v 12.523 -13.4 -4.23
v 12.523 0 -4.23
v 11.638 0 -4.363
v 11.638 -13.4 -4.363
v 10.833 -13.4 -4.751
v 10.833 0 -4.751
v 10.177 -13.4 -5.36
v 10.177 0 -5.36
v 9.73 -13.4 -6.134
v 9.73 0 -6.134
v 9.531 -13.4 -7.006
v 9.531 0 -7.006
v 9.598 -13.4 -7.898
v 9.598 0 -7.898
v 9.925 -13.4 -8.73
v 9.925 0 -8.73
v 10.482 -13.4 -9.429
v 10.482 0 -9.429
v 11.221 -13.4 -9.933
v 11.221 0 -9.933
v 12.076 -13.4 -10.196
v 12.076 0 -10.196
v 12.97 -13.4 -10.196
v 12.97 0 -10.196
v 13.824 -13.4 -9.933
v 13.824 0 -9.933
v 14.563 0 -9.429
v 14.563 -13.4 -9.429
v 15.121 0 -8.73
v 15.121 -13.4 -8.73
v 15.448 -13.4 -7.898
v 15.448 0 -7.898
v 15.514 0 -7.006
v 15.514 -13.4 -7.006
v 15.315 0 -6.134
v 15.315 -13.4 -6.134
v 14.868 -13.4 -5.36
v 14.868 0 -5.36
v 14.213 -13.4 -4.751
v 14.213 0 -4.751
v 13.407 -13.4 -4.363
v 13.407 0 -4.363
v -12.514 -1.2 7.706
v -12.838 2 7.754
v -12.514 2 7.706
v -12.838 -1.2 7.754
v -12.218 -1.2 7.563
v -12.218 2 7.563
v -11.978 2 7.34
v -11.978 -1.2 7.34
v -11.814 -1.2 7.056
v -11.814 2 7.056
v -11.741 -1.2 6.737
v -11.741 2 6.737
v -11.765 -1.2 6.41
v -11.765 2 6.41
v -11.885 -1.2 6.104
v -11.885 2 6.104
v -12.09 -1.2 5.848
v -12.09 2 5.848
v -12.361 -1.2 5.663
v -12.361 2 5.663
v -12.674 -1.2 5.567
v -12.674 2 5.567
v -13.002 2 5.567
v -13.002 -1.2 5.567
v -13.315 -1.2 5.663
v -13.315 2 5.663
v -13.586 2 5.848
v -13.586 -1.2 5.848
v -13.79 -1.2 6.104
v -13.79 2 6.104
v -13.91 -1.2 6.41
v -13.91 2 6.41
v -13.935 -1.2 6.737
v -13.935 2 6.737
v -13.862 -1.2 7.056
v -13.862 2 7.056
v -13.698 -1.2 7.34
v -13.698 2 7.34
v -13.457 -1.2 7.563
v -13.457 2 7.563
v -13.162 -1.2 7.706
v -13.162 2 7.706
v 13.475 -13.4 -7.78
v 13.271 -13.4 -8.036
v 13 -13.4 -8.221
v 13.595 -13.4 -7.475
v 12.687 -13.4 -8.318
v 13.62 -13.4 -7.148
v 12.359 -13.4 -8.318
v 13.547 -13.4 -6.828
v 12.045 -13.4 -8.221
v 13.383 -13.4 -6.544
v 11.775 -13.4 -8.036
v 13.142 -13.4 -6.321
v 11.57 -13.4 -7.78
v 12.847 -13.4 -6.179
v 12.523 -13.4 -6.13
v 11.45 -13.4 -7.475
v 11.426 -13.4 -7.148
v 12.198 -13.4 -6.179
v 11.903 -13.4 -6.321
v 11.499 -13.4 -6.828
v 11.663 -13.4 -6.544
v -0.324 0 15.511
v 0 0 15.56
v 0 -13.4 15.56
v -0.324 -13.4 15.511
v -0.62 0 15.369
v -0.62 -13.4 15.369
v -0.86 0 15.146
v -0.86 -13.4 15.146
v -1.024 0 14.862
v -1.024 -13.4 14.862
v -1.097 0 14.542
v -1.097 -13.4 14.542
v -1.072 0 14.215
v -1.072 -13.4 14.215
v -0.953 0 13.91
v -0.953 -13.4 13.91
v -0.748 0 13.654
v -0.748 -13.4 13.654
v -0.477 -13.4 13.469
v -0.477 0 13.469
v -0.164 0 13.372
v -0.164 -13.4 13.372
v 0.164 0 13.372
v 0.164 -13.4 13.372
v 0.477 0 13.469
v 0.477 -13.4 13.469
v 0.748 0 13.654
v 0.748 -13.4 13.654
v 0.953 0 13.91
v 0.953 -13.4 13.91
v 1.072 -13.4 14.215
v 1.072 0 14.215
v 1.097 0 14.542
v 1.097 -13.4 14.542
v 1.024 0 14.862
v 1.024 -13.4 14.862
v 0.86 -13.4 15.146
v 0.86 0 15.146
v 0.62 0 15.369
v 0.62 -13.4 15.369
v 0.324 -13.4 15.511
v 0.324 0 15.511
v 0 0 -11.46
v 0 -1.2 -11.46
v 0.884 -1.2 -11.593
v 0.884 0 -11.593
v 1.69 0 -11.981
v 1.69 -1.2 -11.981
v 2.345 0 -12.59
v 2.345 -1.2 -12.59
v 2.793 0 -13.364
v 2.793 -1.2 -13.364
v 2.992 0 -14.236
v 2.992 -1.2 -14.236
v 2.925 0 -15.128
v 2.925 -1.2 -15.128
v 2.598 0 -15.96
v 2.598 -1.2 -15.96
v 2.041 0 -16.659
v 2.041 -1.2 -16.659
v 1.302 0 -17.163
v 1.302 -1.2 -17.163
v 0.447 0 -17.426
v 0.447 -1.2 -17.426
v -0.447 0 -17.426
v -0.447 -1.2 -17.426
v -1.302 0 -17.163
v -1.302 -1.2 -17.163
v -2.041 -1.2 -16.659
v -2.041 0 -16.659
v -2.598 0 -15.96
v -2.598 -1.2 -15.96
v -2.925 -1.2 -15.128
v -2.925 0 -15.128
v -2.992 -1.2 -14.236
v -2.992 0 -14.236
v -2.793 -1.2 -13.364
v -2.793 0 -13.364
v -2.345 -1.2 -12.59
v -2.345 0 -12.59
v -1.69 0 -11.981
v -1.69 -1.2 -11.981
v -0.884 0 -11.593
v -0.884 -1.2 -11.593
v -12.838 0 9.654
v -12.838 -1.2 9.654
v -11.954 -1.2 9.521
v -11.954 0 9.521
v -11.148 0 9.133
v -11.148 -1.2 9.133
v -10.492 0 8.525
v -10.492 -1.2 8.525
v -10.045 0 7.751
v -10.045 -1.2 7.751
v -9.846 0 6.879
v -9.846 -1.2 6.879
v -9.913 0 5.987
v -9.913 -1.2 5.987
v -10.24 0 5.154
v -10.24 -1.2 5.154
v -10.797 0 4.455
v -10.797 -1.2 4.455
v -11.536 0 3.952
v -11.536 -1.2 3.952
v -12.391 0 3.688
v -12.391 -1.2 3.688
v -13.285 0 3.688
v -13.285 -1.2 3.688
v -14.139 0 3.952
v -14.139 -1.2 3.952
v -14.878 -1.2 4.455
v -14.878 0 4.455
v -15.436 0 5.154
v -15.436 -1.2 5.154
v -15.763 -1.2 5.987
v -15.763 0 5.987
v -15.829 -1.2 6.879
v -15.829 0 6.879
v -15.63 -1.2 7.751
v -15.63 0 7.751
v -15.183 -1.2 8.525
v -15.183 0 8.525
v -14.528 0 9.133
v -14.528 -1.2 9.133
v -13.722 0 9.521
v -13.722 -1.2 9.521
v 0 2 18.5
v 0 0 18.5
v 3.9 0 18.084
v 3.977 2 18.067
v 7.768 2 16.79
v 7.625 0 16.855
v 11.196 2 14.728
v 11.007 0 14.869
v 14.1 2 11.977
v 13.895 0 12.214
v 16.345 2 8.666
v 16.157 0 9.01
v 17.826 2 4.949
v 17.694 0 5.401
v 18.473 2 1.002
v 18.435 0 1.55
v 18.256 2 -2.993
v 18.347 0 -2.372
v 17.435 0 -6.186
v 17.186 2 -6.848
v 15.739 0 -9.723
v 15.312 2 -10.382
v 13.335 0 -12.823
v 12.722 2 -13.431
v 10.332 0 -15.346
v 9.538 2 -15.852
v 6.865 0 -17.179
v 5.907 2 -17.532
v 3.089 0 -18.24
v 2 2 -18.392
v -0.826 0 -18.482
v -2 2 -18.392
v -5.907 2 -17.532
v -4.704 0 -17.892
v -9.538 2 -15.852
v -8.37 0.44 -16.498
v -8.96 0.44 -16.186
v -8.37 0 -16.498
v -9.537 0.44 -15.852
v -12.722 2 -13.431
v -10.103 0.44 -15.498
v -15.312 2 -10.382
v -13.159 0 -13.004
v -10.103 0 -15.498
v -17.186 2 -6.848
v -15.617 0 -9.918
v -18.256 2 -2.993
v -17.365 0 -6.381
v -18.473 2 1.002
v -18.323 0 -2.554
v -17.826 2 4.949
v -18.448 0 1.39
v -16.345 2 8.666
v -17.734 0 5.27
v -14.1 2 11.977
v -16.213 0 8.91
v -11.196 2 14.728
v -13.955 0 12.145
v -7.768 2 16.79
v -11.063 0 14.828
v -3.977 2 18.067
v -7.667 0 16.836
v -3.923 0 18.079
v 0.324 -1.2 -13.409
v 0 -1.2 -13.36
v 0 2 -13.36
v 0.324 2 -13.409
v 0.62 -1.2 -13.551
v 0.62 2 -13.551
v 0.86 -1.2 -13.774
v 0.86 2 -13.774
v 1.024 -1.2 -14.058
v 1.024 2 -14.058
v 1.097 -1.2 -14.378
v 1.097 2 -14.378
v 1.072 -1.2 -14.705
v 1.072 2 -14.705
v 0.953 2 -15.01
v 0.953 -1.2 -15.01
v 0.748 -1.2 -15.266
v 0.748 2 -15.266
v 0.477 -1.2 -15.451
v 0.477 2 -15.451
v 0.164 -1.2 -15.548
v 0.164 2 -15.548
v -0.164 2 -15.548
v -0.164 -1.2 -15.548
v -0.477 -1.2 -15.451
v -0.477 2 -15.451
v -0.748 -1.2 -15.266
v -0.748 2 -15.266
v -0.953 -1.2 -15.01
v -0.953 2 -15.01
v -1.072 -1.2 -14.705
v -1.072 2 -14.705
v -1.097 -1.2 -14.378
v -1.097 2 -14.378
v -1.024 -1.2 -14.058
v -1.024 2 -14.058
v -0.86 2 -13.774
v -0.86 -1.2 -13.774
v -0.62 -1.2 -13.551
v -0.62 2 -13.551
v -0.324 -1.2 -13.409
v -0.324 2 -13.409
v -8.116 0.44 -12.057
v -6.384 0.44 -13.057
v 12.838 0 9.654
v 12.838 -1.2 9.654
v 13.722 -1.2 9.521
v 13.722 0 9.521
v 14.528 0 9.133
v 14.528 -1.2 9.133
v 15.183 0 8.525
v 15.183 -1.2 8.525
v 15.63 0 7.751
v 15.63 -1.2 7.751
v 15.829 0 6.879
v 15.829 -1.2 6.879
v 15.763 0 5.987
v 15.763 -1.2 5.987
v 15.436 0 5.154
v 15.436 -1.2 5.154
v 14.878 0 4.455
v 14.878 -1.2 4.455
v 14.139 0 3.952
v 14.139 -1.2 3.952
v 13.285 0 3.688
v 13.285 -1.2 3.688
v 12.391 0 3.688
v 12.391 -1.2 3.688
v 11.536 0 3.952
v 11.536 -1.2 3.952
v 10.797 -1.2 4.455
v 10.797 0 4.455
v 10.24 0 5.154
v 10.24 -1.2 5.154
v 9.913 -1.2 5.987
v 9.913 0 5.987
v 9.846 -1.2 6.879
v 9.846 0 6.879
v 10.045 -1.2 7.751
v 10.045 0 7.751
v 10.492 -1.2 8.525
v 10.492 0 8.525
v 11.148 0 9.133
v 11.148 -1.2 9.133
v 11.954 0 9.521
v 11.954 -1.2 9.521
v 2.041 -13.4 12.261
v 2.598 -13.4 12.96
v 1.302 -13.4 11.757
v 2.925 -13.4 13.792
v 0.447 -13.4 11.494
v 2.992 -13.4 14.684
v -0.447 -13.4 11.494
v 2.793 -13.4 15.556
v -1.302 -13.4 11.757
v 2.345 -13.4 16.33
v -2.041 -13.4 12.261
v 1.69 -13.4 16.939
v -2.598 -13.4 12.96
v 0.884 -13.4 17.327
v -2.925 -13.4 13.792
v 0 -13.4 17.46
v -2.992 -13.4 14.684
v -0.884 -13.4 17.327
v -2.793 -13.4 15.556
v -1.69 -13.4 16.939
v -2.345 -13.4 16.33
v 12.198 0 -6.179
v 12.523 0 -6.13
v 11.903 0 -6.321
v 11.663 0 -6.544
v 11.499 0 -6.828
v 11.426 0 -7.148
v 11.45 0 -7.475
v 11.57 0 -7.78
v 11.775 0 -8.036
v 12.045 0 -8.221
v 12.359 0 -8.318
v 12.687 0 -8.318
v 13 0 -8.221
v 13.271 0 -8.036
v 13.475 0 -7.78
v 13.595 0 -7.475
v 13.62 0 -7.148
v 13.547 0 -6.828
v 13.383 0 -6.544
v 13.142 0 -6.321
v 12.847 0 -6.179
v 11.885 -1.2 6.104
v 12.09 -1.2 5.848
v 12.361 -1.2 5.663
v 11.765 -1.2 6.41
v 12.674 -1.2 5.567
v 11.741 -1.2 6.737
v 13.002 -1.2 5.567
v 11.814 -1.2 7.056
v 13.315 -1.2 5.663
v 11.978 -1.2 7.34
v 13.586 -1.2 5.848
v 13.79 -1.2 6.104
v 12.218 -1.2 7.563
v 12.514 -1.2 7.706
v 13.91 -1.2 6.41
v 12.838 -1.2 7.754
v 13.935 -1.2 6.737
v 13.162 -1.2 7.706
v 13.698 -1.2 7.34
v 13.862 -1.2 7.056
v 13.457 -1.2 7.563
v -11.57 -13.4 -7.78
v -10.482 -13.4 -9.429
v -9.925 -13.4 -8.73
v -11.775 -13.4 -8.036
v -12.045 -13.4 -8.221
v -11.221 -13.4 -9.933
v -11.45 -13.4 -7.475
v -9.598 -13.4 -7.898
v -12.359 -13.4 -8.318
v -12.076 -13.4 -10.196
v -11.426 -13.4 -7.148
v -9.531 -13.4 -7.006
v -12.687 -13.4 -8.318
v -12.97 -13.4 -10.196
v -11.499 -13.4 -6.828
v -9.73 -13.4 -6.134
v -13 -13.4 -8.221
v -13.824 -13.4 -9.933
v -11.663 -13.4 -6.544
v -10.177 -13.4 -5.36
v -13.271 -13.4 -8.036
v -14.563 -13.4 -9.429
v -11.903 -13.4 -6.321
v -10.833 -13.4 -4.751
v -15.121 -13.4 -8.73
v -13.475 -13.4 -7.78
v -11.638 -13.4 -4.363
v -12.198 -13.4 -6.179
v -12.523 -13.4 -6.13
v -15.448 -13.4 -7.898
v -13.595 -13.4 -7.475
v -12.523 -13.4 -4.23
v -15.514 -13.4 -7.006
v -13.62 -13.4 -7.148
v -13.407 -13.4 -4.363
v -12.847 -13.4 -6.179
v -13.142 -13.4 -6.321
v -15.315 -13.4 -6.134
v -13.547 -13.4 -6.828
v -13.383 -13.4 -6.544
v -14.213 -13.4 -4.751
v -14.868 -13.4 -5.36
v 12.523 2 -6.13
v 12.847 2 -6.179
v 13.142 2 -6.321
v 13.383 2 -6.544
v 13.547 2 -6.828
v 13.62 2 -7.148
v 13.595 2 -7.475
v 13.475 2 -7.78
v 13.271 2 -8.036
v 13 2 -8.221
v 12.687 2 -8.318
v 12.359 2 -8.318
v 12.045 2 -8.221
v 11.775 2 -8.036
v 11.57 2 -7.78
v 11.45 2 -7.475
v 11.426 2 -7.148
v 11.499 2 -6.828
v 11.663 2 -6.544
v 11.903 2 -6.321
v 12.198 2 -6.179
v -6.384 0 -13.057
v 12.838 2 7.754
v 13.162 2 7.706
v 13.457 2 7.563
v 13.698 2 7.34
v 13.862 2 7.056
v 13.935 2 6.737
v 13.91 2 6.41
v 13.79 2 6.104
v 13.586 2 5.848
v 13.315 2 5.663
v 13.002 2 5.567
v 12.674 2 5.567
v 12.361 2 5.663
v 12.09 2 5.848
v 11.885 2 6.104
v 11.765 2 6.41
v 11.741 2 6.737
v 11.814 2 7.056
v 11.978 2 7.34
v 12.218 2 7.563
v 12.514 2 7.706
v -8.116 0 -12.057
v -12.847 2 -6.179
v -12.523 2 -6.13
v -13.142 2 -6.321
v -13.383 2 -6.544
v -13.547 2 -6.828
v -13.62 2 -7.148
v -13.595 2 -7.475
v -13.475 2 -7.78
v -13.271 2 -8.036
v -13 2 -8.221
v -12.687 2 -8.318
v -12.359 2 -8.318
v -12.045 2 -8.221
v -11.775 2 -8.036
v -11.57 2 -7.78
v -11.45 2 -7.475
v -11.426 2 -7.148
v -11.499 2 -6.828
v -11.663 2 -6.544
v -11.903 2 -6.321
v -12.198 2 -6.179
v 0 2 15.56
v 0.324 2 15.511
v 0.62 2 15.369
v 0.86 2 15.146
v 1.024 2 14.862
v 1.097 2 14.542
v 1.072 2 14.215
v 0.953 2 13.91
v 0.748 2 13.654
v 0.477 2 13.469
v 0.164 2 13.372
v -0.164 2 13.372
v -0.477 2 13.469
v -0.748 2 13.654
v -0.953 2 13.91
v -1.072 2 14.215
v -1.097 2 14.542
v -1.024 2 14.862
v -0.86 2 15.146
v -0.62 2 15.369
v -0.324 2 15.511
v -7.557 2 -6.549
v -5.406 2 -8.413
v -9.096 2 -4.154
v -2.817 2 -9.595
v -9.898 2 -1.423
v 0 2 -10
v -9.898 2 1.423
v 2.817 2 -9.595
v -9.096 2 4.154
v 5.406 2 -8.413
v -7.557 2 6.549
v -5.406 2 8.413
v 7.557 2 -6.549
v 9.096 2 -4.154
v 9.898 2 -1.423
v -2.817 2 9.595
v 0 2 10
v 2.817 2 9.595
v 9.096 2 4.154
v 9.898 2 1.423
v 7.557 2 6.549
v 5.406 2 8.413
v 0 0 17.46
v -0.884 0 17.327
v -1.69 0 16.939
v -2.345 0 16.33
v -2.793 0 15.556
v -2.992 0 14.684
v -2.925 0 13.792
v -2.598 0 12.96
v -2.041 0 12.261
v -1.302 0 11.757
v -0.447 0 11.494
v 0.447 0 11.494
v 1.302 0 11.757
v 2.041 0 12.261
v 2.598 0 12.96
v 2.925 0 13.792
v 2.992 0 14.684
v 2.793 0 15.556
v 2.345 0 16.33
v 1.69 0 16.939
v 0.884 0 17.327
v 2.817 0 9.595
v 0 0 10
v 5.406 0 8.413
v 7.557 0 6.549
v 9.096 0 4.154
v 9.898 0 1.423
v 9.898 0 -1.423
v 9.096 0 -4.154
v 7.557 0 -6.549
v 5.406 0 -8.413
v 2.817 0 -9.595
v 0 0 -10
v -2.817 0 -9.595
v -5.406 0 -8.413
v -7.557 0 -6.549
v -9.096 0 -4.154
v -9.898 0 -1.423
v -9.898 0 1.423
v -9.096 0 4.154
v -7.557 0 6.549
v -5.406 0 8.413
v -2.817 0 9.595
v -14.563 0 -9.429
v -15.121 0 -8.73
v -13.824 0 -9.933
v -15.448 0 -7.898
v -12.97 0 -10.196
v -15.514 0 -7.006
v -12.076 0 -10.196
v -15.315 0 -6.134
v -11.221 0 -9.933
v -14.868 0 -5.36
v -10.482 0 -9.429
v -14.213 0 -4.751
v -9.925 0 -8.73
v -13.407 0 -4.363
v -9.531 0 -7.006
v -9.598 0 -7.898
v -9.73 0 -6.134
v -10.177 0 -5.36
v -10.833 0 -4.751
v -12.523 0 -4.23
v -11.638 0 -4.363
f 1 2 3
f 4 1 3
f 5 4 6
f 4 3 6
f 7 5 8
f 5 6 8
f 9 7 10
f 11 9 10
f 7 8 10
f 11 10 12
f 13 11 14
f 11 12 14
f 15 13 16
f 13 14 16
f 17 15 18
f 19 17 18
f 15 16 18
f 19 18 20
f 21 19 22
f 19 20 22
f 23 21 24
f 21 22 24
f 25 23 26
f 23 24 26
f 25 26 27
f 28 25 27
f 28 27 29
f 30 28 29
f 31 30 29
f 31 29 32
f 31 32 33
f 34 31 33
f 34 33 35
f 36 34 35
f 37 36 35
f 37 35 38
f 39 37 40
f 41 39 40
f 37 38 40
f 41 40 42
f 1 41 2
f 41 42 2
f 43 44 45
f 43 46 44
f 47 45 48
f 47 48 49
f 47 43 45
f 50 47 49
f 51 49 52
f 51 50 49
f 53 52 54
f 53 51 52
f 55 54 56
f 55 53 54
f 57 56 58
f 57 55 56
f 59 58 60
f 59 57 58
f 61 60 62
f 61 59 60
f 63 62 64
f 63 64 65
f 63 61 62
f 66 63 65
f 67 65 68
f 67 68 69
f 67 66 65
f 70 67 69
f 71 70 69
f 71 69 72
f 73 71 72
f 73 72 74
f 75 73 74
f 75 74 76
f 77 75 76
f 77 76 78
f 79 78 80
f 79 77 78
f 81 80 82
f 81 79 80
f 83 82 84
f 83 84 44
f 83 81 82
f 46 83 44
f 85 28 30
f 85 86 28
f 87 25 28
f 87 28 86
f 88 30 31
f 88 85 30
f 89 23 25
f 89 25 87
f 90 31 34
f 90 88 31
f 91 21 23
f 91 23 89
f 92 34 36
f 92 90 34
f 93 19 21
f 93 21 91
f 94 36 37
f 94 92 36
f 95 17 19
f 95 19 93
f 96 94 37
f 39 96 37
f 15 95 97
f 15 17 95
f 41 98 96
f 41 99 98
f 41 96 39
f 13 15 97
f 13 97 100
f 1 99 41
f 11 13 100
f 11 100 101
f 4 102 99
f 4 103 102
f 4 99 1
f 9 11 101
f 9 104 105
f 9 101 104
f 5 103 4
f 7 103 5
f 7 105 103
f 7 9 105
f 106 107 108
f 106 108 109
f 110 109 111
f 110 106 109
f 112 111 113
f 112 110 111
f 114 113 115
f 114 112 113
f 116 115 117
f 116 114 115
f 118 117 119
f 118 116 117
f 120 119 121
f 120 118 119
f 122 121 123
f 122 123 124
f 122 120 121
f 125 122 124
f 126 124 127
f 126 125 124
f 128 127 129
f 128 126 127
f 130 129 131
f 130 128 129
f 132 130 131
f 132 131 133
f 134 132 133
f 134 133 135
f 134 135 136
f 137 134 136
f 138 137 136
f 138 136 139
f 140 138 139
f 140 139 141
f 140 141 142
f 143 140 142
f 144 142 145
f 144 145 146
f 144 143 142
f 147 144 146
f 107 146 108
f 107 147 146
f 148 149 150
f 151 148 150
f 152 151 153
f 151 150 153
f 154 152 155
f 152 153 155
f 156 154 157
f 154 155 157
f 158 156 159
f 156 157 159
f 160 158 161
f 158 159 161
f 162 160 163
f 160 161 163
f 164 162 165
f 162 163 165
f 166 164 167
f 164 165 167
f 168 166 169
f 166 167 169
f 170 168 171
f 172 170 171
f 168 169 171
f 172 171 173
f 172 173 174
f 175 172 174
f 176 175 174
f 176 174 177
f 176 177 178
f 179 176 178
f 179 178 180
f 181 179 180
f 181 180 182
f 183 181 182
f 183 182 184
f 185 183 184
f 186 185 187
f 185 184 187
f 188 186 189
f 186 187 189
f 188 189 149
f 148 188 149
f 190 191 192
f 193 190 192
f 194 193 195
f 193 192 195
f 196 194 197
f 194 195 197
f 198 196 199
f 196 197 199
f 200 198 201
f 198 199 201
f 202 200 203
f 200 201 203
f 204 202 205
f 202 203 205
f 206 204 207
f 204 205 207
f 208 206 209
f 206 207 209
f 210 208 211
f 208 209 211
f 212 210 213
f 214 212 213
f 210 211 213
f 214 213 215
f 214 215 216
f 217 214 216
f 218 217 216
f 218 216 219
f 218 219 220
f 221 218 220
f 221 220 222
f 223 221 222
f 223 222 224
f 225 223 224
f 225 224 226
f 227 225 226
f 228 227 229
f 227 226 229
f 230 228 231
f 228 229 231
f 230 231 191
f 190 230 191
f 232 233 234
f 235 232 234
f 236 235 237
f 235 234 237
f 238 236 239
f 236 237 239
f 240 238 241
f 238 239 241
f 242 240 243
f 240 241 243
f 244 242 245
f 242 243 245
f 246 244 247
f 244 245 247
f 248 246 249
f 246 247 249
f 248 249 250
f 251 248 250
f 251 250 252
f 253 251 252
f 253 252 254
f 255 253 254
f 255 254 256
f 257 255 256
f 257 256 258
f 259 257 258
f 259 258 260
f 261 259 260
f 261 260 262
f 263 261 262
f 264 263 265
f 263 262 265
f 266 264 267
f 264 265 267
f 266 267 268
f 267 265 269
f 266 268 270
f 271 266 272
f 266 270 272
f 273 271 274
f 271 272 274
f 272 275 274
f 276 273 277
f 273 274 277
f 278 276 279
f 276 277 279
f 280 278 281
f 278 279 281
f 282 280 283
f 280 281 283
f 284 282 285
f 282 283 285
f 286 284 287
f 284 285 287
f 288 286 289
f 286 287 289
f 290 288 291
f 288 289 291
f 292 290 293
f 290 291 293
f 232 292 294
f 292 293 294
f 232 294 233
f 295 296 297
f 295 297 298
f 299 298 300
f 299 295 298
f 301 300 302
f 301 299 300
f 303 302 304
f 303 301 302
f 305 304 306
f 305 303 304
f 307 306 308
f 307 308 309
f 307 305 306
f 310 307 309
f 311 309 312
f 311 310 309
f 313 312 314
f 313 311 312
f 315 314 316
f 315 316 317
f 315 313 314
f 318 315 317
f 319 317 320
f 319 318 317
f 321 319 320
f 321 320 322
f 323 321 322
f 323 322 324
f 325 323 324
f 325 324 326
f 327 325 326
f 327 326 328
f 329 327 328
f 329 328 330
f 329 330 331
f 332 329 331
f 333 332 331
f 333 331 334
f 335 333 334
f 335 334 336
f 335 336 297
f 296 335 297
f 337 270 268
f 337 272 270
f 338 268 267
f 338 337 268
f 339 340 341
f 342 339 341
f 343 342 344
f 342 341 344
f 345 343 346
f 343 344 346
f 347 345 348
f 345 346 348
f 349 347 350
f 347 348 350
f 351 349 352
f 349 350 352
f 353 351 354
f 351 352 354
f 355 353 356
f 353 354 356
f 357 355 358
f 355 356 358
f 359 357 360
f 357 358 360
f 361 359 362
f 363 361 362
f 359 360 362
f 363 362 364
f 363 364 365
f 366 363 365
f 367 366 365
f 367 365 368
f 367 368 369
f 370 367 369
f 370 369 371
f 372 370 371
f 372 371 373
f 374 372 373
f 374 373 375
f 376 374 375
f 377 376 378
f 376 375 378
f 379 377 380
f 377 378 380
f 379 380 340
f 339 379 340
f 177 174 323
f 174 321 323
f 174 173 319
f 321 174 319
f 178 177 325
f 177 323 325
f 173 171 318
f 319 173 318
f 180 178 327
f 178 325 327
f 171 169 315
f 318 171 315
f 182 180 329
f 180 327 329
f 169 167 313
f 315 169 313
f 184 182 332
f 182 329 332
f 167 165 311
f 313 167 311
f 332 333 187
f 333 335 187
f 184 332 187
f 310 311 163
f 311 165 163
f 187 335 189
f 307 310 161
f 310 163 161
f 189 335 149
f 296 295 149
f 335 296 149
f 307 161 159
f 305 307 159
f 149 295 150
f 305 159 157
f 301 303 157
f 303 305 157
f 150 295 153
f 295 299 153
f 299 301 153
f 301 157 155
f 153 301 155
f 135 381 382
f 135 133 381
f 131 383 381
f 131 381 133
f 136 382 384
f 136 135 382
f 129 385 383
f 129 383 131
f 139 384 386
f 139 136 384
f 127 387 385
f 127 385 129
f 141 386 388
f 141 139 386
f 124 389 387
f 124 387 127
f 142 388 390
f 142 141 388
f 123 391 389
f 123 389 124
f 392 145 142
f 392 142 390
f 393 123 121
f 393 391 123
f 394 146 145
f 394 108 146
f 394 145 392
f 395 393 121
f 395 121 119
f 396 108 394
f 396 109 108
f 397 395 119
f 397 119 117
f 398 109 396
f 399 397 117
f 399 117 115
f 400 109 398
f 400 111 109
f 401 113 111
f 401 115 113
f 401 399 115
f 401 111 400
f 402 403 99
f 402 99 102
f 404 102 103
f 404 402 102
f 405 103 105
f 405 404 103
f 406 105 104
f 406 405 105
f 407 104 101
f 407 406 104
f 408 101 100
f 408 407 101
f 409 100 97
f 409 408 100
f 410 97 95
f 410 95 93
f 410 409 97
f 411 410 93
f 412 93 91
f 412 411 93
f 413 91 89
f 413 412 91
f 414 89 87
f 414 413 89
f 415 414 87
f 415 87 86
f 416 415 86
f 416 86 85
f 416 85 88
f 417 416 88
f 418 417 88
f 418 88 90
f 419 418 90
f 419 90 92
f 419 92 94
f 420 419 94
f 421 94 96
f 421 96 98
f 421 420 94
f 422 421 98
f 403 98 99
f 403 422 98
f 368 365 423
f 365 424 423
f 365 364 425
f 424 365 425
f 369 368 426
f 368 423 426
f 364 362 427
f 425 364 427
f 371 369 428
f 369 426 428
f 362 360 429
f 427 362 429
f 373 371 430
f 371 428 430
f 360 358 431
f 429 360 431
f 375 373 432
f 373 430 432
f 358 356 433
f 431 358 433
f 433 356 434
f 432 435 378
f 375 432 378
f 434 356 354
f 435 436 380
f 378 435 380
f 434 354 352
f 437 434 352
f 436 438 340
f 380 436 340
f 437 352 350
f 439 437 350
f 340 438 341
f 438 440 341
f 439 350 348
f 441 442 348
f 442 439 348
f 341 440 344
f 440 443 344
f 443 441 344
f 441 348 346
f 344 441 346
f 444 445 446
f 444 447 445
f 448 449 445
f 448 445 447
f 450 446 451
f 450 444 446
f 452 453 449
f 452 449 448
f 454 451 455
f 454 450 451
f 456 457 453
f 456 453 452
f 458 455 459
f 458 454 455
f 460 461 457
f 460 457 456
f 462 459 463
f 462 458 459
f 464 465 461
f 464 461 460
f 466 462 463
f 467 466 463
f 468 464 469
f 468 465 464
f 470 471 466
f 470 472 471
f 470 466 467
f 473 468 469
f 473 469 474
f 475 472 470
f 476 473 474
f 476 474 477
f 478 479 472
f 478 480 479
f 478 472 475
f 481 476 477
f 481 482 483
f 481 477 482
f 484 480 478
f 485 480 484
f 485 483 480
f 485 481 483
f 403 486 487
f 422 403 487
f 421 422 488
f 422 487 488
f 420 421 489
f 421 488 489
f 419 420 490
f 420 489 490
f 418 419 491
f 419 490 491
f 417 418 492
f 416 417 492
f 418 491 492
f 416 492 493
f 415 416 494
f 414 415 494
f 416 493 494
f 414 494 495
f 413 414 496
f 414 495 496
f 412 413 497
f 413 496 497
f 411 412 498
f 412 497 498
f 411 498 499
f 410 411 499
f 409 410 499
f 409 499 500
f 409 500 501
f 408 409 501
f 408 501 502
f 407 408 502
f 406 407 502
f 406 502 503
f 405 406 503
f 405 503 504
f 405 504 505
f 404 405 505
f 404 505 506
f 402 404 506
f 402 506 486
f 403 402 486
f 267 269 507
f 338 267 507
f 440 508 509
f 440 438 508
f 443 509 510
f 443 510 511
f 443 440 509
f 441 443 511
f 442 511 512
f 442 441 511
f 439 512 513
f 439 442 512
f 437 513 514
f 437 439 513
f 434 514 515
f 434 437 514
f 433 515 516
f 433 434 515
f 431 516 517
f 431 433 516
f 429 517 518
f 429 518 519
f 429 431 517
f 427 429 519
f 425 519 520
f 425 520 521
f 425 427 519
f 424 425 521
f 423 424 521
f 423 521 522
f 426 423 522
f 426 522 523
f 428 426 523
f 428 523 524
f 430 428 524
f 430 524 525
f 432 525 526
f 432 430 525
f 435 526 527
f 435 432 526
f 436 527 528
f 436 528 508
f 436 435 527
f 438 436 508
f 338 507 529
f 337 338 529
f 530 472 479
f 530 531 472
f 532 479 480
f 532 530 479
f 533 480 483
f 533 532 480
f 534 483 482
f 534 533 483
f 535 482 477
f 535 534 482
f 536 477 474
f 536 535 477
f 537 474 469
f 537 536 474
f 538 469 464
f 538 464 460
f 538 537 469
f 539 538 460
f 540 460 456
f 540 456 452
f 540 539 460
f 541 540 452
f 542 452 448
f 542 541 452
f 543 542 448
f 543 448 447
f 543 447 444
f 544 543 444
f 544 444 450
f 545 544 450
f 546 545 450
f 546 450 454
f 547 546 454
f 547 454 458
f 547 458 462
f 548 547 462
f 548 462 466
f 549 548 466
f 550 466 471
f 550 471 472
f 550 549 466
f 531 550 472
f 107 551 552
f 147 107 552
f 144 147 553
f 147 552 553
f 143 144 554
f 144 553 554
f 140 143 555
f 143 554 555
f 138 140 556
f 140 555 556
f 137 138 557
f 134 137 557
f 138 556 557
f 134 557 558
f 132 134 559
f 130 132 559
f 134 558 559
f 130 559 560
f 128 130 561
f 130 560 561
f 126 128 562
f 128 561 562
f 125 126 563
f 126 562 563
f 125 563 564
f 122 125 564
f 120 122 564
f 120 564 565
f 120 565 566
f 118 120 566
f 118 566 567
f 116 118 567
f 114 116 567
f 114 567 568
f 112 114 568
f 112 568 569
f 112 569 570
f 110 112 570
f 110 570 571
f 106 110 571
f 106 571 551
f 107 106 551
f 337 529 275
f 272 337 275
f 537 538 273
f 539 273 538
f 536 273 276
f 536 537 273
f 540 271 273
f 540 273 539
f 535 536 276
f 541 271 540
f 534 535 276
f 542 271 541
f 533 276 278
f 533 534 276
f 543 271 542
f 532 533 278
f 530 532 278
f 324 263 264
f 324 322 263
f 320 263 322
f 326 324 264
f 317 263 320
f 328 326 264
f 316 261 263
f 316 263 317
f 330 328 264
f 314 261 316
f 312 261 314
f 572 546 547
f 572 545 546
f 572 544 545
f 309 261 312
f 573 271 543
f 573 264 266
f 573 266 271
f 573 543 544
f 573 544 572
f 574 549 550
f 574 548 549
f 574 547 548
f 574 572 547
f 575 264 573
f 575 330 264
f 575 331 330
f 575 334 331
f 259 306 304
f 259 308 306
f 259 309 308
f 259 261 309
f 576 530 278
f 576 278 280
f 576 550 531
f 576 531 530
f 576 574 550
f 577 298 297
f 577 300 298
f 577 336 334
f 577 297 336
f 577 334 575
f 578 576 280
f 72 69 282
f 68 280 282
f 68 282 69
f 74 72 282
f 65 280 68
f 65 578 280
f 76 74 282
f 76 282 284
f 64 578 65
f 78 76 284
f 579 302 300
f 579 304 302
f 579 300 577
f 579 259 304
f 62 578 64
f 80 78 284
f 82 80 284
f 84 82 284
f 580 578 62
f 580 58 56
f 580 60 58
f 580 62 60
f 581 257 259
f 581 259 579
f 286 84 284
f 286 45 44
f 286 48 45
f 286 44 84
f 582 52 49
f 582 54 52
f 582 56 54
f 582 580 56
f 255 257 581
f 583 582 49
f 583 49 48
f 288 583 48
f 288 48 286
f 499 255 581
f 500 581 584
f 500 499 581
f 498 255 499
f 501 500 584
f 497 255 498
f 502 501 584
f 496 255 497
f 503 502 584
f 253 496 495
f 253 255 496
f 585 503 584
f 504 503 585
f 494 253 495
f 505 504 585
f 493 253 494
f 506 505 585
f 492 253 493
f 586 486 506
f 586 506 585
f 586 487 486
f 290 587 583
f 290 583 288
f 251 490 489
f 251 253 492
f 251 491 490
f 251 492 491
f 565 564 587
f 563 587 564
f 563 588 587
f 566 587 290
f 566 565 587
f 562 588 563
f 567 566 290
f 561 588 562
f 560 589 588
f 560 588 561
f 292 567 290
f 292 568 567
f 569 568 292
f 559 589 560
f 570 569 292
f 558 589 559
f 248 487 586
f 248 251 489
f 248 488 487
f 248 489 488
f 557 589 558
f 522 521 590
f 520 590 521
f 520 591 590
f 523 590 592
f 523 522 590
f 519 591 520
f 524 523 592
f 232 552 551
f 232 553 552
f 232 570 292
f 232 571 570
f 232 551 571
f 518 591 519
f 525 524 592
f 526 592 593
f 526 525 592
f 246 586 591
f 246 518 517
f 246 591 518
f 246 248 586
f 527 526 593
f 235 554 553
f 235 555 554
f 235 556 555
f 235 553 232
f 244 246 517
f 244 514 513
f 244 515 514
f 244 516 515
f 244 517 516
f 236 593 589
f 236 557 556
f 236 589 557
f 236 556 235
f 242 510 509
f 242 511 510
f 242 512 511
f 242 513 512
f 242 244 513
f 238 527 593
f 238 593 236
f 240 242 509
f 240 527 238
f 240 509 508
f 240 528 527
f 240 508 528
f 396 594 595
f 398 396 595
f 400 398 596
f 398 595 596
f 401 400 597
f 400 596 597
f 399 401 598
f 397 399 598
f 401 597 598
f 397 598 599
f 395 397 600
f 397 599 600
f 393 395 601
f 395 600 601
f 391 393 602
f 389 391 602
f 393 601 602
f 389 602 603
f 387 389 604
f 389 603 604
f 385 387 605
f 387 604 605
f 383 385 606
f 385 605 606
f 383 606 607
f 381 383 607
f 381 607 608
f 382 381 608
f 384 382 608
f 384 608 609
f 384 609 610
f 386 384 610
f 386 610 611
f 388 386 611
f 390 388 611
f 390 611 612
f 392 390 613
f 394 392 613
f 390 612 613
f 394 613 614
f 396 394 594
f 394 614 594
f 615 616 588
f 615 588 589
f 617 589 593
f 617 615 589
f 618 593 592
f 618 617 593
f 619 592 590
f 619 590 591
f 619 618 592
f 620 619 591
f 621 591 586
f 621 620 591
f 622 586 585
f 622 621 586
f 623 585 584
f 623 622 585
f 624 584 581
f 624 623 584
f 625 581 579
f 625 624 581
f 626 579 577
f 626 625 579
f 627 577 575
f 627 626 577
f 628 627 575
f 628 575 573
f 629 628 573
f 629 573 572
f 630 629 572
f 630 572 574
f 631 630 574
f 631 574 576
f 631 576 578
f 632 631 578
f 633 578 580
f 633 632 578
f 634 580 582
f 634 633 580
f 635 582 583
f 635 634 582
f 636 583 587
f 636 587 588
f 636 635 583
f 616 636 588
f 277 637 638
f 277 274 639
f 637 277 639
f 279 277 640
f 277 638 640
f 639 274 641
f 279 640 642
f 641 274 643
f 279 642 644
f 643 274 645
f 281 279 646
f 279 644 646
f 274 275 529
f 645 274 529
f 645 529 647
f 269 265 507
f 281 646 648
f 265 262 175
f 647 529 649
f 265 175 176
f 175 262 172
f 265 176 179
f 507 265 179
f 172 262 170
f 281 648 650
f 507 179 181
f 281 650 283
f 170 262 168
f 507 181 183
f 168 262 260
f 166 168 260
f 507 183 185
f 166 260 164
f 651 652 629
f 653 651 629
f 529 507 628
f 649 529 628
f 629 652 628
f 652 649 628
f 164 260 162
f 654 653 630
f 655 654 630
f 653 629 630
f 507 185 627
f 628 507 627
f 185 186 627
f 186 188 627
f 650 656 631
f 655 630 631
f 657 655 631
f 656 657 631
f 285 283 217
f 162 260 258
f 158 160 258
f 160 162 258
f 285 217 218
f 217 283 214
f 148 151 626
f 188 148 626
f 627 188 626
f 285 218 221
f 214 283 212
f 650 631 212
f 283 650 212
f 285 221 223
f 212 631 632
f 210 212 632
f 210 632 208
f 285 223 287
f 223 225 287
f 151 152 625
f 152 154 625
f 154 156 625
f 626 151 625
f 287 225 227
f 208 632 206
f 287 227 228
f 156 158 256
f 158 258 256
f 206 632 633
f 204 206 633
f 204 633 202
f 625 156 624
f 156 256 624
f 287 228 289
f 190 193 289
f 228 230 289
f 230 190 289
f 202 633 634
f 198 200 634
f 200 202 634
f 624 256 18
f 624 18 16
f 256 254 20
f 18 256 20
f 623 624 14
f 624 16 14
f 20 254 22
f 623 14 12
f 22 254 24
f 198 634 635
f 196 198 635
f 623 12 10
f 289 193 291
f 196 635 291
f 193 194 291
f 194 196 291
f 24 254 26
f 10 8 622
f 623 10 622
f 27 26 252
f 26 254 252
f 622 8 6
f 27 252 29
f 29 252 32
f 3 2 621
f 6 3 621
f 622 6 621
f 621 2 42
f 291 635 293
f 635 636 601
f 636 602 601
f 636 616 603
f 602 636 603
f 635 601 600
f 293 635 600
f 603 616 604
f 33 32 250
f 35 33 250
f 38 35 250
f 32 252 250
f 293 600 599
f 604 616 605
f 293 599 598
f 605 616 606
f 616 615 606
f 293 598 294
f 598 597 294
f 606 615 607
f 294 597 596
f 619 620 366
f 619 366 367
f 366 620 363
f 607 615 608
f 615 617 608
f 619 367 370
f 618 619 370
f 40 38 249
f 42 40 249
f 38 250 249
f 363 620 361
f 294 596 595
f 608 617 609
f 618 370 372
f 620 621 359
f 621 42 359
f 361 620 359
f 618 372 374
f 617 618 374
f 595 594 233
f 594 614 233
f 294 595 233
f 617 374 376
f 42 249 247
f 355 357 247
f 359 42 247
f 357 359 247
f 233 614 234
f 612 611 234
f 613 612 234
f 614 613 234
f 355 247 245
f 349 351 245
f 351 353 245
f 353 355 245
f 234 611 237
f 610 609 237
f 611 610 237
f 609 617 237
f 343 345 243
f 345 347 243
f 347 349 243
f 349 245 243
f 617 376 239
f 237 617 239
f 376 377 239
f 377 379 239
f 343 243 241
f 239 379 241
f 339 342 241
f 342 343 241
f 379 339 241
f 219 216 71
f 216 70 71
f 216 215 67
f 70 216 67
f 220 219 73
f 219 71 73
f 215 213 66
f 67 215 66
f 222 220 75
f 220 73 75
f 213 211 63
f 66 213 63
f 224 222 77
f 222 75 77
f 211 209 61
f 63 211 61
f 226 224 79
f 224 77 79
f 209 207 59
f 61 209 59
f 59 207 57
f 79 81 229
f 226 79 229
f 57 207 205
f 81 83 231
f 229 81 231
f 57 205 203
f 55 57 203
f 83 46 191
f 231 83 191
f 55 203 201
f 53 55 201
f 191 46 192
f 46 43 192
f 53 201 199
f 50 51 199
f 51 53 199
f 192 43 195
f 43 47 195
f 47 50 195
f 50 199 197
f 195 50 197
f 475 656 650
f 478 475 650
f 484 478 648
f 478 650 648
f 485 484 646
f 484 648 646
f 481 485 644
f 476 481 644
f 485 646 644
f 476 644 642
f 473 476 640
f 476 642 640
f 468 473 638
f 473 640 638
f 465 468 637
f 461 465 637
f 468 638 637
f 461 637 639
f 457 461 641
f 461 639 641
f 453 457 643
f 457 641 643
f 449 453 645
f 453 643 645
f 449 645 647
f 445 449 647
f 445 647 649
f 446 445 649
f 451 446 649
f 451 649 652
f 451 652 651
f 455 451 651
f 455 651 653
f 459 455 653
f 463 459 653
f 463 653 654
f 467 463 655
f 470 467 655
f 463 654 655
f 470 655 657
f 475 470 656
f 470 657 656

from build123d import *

# Parameters (mm, degrees)
SKETCH_1_R          = 18.5
SKETCH_1_R_2        = 10
SKETCH_1_R_3        = 1.1
EXTRUDE_1_DEPTH     = 2
EXTRUDE_START       = -3.2
SKETCH_2_R          = 3
SKETCH_2_R_2        = 1.1
EXTRUDE_2_DEPTH     = 1.2
SKETCH_3_R          = 1.1
CUT_EXTRUDE_1_DEPTH = 27.357921011
SKETCH_4_R          = 3
SKETCH_4_R_2        = 1.1
EXTRUDE_3_DEPTH     = 13.4
CUT_EXTRUDE_2_DEPTH = 0.44


with BuildPart() as part:
    # Эскиз1 → Бобышка-Вытянуть1 (new body)
    with BuildSketch(Plane(origin=(0, 0, 0), x_dir=(1, 0, 0), z_dir=(0, 1, 0))):
        with Locations(Location((0, 0, 0), (0, 0, 270))):
            Circle(SKETCH_1_R)
        with Locations(Location((0, 0, 0), (0, 0, 270))):
            Circle(SKETCH_1_R_2, mode=Mode.SUBTRACT)
        with Locations(Location((0, 14.46, 0), (0, 0, 270))):
            Circle(SKETCH_1_R_3, mode=Mode.SUBTRACT)
        with Locations(Location((12.837810469, -6.654488888, 0), (0, 0, 270))):
            Circle(SKETCH_1_R_3, mode=Mode.SUBTRACT)
        with Locations(Location((-12.837810469, -6.654488888, 0), (0, 0, 270))):
            Circle(SKETCH_1_R_3, mode=Mode.SUBTRACT)
    extrude(amount=EXTRUDE_1_DEPTH)

    # Эскиз2 → Бобышка-Вытянуть2 (add)
    # profile 1 of 3: a face of its own
    with BuildSketch(Plane(origin=(0, 2, 0), x_dir=(1, 0, 0), z_dir=(0, 1, 0)).offset(EXTRUDE_START)):
        with Locations(Location((0, 14.46, 0), (0, 0, 270))):
            Circle(SKETCH_2_R)
        with Locations(Location((0, 14.46, 0), (0, 0, 270))):
            Circle(SKETCH_2_R_2, mode=Mode.SUBTRACT)
    # profile 2 of 3: a face of its own
    with BuildSketch(Plane(origin=(0, 2, 0), x_dir=(1, 0, 0), z_dir=(0, 1, 0)).offset(EXTRUDE_START)):
        with Locations(Location((-12.837810469, -6.654488888, 0), (0, 0, 270))):
            Circle(SKETCH_2_R)
        with Locations(Location((-12.837810469, -6.654488888, 0), (0, 0, 270))):
            Circle(SKETCH_2_R_2, mode=Mode.SUBTRACT)
    # profile 3 of 3: a face of its own
    with BuildSketch(Plane(origin=(0, 2, 0), x_dir=(1, 0, 0), z_dir=(0, 1, 0)).offset(EXTRUDE_START)):
        with Locations(Location((12.837810469, -6.654488888, 0), (0, 0, 270))):
            Circle(SKETCH_2_R)
        with Locations(Location((12.837810469, -6.654488888, 0), (0, 0, 270))):
            Circle(SKETCH_2_R_2, mode=Mode.SUBTRACT)
    extrude(amount=EXTRUDE_2_DEPTH)

    # Эскиз3 → Вырез-Вытянуть1 (cut, through all)
    with BuildSketch(Plane(origin=(0, 2, 0), x_dir=(1, 0, 0), z_dir=(0, 1, 0))):
        with Locations(Location((-12.522727339, 7.23, 0), (0, 0, 270))):
            Circle(SKETCH_3_R)
        with Locations(Location((12.522727339, 7.23, 0), (0, 0, 270))):
            Circle(SKETCH_3_R)
        with Locations(Location((0, -14.46, 0), (0, 0, 270))):
            Circle(SKETCH_3_R)
    extrude(amount=-CUT_EXTRUDE_1_DEPTH, mode=Mode.SUBTRACT)

    # Эскиз4 → Бобышка-Вытянуть3 (add)
    # profile 1 of 3: a face of its own
    with BuildSketch(Plane.XZ):
        with Locations(Location((-12.522727339, -7.23, 0), (0, 0, 90))):
            Circle(SKETCH_4_R)
        with Locations(Location((-12.522727339, -7.23, 0), (0, 0, 90))):
            Circle(SKETCH_4_R_2, mode=Mode.SUBTRACT)
    # profile 2 of 3: a face of its own
    with BuildSketch(Plane.XZ):
        with Locations(Location((0, 14.46, 0), (0, 0, 90))):
            Circle(SKETCH_4_R)
        with Locations(Location((0, 14.46, 0), (0, 0, 90))):
            Circle(SKETCH_4_R_2, mode=Mode.SUBTRACT)
    # profile 3 of 3: a face of its own
    with BuildSketch(Plane.XZ):
        with Locations(Location((12.522727339, -7.23, 0), (0, 0, 90))):
            Circle(SKETCH_4_R)
        with Locations(Location((12.522727339, -7.23, 0), (0, 0, 90))):
            Circle(SKETCH_4_R_2, mode=Mode.SUBTRACT)
    extrude(amount=EXTRUDE_3_DEPTH)

    # Эскиз5 → Вырез-Вытянуть2 (cut)
    with BuildSketch(Plane.XZ):
        Polygon((-8.383974596, -16.52146997), (-6.383974596, -13.057368355), (-8.116025404, -12.057368355), (-10.116025404, -15.52146997), align=None)
    extrude(amount=-CUT_EXTRUDE_2_DEPTH, mode=Mode.SUBTRACT)


solid = part.part
